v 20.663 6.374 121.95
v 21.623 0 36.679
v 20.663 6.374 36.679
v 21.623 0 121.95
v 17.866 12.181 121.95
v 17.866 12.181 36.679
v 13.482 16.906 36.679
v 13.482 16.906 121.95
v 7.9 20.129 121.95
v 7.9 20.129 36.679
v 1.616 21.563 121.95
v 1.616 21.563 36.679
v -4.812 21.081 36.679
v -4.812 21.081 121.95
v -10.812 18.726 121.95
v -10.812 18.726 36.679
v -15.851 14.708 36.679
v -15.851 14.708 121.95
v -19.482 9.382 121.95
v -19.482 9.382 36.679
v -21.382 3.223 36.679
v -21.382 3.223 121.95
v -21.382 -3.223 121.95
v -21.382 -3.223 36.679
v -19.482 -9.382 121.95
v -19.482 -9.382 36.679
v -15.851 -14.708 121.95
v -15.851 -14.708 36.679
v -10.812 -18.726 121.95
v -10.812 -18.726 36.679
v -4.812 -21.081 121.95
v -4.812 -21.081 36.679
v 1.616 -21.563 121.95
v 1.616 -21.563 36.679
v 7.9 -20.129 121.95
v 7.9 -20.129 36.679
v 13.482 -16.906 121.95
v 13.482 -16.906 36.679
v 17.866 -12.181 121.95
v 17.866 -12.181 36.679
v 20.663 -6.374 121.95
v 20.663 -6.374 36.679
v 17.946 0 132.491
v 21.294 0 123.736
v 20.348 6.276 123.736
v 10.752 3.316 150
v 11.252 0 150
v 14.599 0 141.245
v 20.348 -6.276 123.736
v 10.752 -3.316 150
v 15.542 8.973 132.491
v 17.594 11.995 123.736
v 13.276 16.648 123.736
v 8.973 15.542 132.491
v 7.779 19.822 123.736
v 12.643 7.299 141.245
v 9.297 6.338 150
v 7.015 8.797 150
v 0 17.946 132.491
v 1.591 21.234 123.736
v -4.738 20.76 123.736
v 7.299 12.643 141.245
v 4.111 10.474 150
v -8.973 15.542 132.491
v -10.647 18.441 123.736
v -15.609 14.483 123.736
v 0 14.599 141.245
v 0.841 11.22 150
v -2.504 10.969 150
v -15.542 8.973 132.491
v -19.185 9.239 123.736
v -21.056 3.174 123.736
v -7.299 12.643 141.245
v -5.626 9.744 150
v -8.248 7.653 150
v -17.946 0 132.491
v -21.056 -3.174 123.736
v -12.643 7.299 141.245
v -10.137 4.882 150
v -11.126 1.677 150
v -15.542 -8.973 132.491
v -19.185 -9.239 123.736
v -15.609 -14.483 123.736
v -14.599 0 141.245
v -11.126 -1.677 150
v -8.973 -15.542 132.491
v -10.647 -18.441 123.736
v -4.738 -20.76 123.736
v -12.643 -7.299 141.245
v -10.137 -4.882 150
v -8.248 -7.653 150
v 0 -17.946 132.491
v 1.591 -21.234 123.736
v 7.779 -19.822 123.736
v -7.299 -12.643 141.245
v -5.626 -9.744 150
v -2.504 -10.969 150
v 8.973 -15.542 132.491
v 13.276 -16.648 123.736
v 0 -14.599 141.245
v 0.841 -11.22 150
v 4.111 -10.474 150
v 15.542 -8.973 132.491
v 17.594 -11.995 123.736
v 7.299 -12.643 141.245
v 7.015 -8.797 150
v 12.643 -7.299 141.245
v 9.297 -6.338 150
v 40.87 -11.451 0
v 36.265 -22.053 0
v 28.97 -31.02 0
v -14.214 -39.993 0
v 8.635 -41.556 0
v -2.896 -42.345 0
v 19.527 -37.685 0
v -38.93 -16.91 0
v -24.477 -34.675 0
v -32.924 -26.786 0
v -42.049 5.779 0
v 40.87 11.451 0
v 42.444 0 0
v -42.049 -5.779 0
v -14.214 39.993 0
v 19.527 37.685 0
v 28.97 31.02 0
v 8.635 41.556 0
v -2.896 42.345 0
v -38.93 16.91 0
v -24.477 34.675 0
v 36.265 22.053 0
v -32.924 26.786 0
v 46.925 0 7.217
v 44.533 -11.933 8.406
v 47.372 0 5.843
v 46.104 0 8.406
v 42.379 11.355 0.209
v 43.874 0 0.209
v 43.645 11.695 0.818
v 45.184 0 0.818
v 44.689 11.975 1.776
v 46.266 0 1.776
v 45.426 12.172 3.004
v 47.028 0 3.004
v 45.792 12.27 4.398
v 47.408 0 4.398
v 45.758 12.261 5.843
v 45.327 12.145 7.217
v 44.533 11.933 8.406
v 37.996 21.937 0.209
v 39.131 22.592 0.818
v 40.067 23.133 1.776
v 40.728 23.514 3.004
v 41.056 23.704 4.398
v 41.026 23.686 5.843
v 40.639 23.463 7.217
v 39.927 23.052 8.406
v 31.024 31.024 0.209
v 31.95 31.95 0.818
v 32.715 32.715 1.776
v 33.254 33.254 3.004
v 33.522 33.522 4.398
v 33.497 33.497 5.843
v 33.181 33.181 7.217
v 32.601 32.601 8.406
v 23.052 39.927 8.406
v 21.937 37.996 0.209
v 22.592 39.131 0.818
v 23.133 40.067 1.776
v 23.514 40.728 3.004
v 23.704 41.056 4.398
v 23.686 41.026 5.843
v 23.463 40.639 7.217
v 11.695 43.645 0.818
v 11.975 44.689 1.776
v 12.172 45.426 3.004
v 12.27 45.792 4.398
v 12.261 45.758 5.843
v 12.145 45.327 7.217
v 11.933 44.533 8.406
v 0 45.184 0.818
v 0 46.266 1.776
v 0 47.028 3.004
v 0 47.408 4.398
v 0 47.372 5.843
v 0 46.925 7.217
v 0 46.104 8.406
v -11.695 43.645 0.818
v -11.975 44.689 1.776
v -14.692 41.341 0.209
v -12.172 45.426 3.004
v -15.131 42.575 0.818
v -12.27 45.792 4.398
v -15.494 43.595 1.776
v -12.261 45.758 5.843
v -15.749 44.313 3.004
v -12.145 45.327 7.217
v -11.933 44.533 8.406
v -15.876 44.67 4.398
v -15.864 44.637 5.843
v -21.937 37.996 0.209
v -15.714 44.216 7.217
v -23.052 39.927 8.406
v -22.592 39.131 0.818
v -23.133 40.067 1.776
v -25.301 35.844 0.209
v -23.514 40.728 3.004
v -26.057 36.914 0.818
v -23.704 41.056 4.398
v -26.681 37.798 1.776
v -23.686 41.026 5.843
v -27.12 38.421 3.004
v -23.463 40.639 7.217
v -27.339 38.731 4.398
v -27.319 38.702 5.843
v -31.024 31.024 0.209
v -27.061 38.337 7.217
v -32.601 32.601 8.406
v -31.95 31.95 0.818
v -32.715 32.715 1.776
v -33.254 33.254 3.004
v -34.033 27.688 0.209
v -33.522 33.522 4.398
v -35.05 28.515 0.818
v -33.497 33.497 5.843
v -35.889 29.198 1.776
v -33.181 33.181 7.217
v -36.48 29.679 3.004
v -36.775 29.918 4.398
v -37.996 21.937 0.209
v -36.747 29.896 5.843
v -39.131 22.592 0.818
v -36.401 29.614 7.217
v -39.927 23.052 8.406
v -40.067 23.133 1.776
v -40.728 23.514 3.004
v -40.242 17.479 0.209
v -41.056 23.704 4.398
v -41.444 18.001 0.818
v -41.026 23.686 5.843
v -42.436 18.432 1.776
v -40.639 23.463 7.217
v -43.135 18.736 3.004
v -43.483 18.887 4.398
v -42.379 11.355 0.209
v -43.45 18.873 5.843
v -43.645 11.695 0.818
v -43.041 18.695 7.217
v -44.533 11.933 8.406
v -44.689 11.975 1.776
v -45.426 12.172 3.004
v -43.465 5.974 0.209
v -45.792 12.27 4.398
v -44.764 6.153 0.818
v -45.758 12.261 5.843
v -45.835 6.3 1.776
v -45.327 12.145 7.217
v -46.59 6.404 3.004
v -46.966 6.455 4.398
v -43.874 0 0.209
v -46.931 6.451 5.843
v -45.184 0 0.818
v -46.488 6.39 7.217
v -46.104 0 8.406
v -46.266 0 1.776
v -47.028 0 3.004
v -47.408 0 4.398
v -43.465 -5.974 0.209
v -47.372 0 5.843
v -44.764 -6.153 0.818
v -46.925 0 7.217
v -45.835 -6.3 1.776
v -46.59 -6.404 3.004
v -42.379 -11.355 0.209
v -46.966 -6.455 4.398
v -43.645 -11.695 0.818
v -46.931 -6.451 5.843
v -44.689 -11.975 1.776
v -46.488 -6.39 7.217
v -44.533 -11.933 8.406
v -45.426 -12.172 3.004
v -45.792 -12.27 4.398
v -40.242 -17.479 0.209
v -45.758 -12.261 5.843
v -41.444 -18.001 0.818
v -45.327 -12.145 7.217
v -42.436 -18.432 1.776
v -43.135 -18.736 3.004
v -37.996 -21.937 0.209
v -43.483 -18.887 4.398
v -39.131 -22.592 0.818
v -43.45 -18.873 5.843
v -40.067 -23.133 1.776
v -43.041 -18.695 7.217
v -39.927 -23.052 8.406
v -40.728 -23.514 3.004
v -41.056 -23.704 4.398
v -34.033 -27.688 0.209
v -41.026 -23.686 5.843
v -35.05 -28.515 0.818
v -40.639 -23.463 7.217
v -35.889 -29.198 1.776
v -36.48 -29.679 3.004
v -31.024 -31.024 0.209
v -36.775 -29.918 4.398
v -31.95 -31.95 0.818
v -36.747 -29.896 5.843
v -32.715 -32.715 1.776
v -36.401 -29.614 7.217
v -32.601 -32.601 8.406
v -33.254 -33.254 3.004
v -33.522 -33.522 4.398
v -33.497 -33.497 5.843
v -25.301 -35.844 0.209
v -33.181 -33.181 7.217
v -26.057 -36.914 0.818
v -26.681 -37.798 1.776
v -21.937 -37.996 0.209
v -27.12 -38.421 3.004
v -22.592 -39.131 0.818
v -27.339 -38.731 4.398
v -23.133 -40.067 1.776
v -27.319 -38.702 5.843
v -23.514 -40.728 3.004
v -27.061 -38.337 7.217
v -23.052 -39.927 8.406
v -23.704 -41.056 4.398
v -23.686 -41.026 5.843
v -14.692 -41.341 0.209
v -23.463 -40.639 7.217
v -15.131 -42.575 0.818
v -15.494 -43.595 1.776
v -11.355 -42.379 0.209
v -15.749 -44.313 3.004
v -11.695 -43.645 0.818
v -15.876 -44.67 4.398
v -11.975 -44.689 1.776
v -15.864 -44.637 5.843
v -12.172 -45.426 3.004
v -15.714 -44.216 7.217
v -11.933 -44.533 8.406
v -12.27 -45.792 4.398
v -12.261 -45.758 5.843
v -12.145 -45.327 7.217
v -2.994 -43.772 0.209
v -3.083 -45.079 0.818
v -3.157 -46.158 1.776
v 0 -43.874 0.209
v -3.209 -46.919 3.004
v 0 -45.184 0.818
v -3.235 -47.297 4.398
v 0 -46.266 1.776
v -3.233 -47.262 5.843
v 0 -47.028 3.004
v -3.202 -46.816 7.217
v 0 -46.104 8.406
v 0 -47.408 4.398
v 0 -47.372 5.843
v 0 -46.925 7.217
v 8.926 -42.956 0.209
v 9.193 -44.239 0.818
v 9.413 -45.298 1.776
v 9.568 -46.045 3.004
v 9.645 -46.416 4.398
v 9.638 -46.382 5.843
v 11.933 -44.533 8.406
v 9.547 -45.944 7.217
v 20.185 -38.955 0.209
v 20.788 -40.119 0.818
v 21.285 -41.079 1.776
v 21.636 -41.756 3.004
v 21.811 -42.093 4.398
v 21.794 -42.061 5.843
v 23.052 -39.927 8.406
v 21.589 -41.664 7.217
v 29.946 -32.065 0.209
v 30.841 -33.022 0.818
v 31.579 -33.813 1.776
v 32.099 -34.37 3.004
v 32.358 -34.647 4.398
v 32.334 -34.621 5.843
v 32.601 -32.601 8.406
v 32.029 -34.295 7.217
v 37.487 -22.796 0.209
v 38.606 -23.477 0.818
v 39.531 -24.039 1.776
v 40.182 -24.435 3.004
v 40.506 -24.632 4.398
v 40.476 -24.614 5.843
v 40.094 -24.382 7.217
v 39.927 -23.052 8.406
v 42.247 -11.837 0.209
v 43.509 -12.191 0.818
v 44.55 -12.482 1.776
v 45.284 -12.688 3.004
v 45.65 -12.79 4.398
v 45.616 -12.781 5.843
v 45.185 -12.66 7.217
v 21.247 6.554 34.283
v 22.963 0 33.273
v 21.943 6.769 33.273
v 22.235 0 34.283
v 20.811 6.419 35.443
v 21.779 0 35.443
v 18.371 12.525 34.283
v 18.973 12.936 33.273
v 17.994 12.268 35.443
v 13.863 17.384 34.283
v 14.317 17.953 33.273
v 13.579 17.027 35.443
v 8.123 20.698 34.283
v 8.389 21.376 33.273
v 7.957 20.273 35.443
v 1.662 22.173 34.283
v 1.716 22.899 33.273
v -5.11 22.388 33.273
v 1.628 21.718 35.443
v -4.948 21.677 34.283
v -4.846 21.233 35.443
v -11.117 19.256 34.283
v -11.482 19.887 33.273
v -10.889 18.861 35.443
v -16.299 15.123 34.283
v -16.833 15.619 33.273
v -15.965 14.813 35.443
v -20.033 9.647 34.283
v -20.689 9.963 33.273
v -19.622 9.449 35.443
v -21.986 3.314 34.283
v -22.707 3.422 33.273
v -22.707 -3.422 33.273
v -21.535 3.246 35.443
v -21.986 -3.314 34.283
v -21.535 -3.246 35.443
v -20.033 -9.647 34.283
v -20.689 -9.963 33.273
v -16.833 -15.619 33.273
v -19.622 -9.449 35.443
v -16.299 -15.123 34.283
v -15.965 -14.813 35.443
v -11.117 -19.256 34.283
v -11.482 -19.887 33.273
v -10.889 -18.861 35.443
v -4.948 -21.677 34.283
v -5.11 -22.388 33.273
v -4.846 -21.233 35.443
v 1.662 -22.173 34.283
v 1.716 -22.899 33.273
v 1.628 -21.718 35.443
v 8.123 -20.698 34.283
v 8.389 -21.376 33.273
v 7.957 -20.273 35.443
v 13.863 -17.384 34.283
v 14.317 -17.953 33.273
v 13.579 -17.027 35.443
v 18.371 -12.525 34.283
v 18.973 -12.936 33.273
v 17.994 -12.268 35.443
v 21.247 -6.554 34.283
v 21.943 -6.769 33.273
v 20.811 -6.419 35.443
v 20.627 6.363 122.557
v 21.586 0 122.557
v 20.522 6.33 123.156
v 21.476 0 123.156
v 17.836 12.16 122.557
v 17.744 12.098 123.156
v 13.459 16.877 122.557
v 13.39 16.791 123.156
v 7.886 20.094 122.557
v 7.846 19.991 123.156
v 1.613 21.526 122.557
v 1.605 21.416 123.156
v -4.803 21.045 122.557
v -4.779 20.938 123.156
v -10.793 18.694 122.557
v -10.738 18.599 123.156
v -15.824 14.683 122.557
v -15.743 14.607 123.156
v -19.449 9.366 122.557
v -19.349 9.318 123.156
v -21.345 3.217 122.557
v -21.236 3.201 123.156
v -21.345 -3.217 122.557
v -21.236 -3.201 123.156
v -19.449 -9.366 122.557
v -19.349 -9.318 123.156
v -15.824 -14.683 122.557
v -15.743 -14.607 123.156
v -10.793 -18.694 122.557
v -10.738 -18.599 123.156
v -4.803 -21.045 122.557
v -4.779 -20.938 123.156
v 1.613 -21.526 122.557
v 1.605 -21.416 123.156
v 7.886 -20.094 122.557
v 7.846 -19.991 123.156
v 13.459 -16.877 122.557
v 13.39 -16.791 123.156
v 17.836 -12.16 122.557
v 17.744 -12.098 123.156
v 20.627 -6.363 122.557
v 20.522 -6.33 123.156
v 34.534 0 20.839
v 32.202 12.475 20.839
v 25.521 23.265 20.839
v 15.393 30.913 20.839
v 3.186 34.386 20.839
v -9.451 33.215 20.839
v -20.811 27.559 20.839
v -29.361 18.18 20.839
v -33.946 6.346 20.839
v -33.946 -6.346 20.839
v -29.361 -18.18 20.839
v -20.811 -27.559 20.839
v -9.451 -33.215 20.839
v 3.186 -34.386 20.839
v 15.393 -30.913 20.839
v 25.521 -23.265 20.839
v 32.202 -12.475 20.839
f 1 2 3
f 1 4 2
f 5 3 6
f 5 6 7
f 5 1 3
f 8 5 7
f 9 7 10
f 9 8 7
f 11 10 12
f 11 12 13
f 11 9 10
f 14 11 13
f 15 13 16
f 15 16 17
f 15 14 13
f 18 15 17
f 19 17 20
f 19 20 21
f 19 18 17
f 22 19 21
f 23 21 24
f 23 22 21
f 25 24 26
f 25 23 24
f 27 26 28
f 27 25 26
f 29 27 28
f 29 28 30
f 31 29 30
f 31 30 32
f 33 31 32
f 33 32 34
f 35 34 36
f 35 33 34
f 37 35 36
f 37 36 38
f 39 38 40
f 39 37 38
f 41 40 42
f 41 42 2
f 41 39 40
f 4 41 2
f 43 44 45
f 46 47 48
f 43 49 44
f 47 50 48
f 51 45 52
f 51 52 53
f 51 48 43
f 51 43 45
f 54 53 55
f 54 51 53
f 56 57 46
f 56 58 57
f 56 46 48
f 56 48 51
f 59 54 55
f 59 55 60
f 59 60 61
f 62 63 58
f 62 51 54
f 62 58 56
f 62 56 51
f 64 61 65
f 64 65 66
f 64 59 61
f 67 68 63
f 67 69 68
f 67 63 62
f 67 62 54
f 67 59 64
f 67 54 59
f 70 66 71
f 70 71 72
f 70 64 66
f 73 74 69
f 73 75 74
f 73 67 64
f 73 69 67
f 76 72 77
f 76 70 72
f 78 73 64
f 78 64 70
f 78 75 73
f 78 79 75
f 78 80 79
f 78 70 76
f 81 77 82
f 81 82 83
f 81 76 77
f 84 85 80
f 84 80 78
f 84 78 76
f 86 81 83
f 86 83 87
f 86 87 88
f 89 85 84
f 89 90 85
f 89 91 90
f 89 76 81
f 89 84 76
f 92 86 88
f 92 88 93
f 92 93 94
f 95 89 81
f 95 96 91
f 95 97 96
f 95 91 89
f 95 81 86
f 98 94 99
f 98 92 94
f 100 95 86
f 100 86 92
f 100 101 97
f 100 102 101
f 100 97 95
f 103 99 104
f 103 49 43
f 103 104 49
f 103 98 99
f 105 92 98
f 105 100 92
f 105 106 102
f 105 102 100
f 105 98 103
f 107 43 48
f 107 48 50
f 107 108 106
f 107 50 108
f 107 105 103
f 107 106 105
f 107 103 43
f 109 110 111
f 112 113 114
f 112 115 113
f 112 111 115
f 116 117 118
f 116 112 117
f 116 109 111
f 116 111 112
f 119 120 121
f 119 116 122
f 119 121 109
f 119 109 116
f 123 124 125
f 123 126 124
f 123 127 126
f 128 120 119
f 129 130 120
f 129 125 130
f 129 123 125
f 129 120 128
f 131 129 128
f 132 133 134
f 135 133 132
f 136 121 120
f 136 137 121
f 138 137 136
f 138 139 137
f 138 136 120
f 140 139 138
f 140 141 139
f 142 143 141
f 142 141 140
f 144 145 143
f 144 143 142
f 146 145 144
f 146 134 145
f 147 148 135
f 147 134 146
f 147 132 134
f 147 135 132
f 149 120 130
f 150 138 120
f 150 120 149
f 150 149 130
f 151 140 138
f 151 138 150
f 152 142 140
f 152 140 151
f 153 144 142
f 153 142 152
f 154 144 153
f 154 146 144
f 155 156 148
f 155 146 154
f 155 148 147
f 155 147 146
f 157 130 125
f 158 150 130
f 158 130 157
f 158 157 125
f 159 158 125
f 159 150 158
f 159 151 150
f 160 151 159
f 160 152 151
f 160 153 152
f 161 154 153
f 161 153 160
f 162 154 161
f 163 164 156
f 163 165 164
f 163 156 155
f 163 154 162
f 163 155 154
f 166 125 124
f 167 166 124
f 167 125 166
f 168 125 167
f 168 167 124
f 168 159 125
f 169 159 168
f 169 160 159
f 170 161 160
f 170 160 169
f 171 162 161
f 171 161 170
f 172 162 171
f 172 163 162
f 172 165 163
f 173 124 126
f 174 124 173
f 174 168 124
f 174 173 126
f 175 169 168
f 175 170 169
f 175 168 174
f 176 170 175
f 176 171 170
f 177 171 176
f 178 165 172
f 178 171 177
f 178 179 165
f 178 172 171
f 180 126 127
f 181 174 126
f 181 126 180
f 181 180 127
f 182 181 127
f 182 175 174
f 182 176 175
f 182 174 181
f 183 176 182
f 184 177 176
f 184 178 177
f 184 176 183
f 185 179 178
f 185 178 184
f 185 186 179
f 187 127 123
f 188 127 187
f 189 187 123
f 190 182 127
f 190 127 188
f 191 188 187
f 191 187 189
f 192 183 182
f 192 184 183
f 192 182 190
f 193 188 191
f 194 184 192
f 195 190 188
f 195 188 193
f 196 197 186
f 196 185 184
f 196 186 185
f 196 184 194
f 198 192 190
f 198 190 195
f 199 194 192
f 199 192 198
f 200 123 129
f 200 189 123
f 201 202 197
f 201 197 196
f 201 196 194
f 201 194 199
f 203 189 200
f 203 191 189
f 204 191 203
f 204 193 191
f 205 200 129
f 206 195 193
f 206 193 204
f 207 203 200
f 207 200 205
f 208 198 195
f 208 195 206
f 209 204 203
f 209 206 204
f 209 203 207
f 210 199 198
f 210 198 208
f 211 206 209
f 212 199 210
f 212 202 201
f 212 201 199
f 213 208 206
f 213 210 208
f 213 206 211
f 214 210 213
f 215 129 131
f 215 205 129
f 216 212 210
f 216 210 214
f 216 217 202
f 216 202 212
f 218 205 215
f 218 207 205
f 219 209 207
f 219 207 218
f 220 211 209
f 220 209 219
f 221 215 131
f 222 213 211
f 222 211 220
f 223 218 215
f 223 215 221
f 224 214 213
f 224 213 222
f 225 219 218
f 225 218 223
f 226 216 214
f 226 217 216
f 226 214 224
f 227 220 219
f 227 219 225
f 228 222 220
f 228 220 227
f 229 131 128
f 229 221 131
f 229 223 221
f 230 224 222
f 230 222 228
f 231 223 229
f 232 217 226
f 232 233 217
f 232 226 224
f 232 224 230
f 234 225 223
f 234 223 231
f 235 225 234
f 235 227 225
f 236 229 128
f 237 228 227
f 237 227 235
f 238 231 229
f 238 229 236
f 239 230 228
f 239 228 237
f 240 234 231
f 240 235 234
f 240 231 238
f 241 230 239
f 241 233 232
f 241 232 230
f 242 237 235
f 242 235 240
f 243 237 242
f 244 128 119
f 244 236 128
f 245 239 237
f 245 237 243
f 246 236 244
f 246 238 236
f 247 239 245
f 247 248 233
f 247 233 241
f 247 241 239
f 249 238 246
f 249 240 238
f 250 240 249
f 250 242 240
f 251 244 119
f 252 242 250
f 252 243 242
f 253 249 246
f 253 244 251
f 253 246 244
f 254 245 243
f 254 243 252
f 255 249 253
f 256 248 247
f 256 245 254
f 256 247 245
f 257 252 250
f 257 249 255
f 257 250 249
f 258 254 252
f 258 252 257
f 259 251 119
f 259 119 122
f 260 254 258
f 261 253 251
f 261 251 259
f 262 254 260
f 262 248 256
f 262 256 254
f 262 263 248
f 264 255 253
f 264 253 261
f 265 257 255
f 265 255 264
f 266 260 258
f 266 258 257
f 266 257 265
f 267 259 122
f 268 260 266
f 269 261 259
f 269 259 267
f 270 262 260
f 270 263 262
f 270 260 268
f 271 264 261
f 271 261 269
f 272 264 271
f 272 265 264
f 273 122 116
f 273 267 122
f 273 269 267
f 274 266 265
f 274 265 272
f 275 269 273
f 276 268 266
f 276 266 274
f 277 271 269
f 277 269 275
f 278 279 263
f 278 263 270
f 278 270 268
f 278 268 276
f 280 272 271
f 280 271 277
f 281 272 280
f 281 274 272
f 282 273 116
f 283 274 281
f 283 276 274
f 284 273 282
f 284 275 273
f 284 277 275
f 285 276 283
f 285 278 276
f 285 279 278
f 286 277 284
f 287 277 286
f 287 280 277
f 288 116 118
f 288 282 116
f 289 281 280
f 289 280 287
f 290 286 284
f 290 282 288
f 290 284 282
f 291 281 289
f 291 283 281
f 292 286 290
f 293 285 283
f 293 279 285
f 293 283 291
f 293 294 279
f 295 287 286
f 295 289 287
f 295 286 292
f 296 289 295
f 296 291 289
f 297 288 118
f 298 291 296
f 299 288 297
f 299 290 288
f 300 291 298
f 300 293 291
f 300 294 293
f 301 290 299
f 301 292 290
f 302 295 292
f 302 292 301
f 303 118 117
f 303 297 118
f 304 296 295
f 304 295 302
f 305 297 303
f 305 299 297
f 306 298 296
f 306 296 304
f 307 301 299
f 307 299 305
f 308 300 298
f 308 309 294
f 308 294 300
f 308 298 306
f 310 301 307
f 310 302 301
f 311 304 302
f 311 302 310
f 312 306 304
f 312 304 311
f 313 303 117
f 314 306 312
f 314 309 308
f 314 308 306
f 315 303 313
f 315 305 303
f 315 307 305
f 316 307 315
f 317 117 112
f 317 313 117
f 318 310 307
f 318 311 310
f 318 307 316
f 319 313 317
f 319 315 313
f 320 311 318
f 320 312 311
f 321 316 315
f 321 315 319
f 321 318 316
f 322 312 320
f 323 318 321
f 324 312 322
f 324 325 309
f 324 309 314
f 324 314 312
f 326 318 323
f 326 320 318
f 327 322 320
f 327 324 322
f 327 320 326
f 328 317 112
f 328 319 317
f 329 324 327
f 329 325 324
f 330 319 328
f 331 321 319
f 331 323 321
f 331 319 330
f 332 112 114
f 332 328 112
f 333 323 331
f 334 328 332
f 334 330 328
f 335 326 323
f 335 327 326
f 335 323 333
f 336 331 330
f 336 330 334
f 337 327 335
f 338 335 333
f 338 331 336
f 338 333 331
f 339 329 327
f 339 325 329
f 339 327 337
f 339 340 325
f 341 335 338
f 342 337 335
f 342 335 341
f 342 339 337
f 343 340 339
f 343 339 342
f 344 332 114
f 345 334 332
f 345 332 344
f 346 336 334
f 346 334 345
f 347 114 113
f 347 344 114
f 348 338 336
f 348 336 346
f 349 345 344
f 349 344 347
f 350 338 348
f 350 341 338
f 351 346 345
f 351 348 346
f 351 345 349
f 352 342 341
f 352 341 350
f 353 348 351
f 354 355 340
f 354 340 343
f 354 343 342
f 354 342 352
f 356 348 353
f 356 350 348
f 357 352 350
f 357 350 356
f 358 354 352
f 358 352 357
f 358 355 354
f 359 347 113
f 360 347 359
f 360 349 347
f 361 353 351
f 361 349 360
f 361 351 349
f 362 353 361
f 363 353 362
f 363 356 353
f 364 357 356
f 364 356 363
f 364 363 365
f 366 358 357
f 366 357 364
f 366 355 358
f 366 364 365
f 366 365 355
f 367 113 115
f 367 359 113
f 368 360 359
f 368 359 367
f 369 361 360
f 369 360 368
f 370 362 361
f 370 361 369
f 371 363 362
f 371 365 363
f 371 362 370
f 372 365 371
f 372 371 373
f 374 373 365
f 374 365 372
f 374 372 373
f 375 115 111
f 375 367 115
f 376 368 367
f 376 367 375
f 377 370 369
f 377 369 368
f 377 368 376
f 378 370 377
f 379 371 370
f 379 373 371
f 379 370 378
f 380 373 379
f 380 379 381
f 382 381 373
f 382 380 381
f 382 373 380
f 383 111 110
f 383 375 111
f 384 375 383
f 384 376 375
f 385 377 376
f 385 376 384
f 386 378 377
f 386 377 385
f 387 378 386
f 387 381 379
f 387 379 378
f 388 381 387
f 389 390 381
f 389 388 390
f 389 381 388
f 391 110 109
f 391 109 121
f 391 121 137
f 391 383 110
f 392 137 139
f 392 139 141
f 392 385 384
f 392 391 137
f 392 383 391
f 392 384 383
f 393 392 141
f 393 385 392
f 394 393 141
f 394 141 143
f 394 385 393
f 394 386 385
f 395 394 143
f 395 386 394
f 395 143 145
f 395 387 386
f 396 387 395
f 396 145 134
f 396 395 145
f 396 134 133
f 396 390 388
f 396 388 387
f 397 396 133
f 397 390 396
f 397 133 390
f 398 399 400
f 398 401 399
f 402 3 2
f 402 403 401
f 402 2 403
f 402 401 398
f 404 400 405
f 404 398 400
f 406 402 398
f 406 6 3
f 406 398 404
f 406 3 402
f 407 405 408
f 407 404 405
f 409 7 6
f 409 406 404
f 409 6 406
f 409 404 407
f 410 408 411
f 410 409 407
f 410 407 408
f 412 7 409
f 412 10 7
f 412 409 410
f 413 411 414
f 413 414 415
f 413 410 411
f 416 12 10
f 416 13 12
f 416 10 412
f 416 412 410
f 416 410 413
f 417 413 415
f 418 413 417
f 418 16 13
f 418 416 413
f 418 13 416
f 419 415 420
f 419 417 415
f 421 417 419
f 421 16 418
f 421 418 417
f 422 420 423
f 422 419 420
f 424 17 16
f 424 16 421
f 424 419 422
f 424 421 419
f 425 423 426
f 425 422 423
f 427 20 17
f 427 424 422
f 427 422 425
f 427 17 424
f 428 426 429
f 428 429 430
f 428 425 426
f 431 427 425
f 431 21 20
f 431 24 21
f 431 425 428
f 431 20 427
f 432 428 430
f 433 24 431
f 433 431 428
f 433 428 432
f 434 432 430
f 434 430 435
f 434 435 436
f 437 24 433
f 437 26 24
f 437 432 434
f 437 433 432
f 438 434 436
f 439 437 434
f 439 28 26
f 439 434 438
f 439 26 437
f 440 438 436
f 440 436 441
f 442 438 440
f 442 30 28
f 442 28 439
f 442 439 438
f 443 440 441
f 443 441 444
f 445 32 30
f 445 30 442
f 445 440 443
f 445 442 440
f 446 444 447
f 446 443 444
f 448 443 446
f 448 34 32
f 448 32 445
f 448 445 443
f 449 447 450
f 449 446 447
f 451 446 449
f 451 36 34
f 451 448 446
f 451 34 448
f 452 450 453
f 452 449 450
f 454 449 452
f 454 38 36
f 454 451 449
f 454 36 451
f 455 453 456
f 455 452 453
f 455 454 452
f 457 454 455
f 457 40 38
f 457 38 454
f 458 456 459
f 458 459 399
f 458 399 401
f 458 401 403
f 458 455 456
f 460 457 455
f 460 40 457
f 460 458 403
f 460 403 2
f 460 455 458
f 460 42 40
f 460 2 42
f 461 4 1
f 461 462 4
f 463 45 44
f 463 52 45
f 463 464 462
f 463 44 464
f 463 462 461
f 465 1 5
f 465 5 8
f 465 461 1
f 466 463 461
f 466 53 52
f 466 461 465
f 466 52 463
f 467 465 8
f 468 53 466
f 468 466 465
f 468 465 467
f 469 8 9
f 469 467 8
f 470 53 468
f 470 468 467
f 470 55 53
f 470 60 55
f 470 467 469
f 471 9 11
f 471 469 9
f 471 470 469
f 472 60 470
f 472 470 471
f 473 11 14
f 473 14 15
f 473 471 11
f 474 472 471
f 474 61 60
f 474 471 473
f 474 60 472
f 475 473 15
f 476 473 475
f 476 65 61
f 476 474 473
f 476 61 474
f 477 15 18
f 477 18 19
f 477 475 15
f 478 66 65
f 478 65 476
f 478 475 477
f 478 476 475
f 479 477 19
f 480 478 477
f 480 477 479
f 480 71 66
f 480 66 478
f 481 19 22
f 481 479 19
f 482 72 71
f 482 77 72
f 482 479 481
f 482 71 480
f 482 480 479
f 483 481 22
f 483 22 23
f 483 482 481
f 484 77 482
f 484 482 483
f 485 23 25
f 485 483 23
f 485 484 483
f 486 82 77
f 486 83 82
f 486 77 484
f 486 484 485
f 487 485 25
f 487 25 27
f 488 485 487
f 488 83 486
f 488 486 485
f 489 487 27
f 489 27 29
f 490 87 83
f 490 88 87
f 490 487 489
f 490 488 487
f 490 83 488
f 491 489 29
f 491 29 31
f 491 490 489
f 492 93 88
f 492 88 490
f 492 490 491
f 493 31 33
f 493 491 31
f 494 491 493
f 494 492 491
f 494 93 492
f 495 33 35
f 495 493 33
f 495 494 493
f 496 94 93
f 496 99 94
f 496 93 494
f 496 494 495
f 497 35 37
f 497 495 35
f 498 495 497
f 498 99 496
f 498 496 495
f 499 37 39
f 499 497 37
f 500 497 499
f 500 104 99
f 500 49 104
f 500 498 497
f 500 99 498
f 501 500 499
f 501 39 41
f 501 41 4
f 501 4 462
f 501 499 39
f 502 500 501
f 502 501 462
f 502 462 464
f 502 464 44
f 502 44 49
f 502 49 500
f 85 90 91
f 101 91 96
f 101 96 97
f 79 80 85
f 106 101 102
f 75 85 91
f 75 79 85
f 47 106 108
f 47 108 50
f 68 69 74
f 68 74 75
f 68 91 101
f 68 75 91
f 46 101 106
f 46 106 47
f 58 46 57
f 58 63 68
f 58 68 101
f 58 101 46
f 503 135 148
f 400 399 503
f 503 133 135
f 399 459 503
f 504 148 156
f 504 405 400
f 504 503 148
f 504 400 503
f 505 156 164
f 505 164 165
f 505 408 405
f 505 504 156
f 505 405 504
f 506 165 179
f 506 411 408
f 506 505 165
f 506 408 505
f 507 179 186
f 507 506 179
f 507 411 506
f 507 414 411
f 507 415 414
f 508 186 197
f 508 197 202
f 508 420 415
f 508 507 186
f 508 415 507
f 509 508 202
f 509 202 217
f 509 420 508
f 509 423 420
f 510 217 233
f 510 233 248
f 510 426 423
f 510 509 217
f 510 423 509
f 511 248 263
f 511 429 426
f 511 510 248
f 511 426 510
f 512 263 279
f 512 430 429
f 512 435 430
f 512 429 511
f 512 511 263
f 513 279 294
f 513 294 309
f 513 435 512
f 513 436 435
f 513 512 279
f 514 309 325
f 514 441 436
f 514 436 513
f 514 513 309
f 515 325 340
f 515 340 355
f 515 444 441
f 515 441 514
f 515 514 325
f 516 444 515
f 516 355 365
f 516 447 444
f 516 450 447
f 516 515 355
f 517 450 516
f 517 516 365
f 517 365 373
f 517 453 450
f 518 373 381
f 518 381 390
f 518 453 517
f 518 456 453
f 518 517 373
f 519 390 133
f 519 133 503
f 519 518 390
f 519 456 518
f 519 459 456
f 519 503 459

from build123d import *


with BuildPart() as f1:
    # F0 (on Front) → F1 (revolve)
    with BuildSketch(Plane.XZ):
        with BuildLine():
            Line((0, 150), (0, 0))
            Line((0, 0), (42.44396, 0))
            ThreePointArc((42.44396, 0), (47.028244, 3.003917), (46.104204, 8.406262))
            Line((46.104204, 8.406262), (22.963254, 33.272674))
            ThreePointArc((22.963254, 33.272674), (21.970476, 34.848801), (21.623498, 36.678936))
            Line((21.623498, 36.678936), (21.623498, 121.950191))
            ThreePointArc((21.623498, 121.950191), (21.540372, 122.858129), (21.293757, 123.735878))
            Line((21.293757, 123.735878), (11.251598, 150))
            Line((11.251598, 150), (0, 150))
        make_face()
    revolve(axis=Axis((0, 0, 75), (0, 0, 1)))


solid = f1.part
